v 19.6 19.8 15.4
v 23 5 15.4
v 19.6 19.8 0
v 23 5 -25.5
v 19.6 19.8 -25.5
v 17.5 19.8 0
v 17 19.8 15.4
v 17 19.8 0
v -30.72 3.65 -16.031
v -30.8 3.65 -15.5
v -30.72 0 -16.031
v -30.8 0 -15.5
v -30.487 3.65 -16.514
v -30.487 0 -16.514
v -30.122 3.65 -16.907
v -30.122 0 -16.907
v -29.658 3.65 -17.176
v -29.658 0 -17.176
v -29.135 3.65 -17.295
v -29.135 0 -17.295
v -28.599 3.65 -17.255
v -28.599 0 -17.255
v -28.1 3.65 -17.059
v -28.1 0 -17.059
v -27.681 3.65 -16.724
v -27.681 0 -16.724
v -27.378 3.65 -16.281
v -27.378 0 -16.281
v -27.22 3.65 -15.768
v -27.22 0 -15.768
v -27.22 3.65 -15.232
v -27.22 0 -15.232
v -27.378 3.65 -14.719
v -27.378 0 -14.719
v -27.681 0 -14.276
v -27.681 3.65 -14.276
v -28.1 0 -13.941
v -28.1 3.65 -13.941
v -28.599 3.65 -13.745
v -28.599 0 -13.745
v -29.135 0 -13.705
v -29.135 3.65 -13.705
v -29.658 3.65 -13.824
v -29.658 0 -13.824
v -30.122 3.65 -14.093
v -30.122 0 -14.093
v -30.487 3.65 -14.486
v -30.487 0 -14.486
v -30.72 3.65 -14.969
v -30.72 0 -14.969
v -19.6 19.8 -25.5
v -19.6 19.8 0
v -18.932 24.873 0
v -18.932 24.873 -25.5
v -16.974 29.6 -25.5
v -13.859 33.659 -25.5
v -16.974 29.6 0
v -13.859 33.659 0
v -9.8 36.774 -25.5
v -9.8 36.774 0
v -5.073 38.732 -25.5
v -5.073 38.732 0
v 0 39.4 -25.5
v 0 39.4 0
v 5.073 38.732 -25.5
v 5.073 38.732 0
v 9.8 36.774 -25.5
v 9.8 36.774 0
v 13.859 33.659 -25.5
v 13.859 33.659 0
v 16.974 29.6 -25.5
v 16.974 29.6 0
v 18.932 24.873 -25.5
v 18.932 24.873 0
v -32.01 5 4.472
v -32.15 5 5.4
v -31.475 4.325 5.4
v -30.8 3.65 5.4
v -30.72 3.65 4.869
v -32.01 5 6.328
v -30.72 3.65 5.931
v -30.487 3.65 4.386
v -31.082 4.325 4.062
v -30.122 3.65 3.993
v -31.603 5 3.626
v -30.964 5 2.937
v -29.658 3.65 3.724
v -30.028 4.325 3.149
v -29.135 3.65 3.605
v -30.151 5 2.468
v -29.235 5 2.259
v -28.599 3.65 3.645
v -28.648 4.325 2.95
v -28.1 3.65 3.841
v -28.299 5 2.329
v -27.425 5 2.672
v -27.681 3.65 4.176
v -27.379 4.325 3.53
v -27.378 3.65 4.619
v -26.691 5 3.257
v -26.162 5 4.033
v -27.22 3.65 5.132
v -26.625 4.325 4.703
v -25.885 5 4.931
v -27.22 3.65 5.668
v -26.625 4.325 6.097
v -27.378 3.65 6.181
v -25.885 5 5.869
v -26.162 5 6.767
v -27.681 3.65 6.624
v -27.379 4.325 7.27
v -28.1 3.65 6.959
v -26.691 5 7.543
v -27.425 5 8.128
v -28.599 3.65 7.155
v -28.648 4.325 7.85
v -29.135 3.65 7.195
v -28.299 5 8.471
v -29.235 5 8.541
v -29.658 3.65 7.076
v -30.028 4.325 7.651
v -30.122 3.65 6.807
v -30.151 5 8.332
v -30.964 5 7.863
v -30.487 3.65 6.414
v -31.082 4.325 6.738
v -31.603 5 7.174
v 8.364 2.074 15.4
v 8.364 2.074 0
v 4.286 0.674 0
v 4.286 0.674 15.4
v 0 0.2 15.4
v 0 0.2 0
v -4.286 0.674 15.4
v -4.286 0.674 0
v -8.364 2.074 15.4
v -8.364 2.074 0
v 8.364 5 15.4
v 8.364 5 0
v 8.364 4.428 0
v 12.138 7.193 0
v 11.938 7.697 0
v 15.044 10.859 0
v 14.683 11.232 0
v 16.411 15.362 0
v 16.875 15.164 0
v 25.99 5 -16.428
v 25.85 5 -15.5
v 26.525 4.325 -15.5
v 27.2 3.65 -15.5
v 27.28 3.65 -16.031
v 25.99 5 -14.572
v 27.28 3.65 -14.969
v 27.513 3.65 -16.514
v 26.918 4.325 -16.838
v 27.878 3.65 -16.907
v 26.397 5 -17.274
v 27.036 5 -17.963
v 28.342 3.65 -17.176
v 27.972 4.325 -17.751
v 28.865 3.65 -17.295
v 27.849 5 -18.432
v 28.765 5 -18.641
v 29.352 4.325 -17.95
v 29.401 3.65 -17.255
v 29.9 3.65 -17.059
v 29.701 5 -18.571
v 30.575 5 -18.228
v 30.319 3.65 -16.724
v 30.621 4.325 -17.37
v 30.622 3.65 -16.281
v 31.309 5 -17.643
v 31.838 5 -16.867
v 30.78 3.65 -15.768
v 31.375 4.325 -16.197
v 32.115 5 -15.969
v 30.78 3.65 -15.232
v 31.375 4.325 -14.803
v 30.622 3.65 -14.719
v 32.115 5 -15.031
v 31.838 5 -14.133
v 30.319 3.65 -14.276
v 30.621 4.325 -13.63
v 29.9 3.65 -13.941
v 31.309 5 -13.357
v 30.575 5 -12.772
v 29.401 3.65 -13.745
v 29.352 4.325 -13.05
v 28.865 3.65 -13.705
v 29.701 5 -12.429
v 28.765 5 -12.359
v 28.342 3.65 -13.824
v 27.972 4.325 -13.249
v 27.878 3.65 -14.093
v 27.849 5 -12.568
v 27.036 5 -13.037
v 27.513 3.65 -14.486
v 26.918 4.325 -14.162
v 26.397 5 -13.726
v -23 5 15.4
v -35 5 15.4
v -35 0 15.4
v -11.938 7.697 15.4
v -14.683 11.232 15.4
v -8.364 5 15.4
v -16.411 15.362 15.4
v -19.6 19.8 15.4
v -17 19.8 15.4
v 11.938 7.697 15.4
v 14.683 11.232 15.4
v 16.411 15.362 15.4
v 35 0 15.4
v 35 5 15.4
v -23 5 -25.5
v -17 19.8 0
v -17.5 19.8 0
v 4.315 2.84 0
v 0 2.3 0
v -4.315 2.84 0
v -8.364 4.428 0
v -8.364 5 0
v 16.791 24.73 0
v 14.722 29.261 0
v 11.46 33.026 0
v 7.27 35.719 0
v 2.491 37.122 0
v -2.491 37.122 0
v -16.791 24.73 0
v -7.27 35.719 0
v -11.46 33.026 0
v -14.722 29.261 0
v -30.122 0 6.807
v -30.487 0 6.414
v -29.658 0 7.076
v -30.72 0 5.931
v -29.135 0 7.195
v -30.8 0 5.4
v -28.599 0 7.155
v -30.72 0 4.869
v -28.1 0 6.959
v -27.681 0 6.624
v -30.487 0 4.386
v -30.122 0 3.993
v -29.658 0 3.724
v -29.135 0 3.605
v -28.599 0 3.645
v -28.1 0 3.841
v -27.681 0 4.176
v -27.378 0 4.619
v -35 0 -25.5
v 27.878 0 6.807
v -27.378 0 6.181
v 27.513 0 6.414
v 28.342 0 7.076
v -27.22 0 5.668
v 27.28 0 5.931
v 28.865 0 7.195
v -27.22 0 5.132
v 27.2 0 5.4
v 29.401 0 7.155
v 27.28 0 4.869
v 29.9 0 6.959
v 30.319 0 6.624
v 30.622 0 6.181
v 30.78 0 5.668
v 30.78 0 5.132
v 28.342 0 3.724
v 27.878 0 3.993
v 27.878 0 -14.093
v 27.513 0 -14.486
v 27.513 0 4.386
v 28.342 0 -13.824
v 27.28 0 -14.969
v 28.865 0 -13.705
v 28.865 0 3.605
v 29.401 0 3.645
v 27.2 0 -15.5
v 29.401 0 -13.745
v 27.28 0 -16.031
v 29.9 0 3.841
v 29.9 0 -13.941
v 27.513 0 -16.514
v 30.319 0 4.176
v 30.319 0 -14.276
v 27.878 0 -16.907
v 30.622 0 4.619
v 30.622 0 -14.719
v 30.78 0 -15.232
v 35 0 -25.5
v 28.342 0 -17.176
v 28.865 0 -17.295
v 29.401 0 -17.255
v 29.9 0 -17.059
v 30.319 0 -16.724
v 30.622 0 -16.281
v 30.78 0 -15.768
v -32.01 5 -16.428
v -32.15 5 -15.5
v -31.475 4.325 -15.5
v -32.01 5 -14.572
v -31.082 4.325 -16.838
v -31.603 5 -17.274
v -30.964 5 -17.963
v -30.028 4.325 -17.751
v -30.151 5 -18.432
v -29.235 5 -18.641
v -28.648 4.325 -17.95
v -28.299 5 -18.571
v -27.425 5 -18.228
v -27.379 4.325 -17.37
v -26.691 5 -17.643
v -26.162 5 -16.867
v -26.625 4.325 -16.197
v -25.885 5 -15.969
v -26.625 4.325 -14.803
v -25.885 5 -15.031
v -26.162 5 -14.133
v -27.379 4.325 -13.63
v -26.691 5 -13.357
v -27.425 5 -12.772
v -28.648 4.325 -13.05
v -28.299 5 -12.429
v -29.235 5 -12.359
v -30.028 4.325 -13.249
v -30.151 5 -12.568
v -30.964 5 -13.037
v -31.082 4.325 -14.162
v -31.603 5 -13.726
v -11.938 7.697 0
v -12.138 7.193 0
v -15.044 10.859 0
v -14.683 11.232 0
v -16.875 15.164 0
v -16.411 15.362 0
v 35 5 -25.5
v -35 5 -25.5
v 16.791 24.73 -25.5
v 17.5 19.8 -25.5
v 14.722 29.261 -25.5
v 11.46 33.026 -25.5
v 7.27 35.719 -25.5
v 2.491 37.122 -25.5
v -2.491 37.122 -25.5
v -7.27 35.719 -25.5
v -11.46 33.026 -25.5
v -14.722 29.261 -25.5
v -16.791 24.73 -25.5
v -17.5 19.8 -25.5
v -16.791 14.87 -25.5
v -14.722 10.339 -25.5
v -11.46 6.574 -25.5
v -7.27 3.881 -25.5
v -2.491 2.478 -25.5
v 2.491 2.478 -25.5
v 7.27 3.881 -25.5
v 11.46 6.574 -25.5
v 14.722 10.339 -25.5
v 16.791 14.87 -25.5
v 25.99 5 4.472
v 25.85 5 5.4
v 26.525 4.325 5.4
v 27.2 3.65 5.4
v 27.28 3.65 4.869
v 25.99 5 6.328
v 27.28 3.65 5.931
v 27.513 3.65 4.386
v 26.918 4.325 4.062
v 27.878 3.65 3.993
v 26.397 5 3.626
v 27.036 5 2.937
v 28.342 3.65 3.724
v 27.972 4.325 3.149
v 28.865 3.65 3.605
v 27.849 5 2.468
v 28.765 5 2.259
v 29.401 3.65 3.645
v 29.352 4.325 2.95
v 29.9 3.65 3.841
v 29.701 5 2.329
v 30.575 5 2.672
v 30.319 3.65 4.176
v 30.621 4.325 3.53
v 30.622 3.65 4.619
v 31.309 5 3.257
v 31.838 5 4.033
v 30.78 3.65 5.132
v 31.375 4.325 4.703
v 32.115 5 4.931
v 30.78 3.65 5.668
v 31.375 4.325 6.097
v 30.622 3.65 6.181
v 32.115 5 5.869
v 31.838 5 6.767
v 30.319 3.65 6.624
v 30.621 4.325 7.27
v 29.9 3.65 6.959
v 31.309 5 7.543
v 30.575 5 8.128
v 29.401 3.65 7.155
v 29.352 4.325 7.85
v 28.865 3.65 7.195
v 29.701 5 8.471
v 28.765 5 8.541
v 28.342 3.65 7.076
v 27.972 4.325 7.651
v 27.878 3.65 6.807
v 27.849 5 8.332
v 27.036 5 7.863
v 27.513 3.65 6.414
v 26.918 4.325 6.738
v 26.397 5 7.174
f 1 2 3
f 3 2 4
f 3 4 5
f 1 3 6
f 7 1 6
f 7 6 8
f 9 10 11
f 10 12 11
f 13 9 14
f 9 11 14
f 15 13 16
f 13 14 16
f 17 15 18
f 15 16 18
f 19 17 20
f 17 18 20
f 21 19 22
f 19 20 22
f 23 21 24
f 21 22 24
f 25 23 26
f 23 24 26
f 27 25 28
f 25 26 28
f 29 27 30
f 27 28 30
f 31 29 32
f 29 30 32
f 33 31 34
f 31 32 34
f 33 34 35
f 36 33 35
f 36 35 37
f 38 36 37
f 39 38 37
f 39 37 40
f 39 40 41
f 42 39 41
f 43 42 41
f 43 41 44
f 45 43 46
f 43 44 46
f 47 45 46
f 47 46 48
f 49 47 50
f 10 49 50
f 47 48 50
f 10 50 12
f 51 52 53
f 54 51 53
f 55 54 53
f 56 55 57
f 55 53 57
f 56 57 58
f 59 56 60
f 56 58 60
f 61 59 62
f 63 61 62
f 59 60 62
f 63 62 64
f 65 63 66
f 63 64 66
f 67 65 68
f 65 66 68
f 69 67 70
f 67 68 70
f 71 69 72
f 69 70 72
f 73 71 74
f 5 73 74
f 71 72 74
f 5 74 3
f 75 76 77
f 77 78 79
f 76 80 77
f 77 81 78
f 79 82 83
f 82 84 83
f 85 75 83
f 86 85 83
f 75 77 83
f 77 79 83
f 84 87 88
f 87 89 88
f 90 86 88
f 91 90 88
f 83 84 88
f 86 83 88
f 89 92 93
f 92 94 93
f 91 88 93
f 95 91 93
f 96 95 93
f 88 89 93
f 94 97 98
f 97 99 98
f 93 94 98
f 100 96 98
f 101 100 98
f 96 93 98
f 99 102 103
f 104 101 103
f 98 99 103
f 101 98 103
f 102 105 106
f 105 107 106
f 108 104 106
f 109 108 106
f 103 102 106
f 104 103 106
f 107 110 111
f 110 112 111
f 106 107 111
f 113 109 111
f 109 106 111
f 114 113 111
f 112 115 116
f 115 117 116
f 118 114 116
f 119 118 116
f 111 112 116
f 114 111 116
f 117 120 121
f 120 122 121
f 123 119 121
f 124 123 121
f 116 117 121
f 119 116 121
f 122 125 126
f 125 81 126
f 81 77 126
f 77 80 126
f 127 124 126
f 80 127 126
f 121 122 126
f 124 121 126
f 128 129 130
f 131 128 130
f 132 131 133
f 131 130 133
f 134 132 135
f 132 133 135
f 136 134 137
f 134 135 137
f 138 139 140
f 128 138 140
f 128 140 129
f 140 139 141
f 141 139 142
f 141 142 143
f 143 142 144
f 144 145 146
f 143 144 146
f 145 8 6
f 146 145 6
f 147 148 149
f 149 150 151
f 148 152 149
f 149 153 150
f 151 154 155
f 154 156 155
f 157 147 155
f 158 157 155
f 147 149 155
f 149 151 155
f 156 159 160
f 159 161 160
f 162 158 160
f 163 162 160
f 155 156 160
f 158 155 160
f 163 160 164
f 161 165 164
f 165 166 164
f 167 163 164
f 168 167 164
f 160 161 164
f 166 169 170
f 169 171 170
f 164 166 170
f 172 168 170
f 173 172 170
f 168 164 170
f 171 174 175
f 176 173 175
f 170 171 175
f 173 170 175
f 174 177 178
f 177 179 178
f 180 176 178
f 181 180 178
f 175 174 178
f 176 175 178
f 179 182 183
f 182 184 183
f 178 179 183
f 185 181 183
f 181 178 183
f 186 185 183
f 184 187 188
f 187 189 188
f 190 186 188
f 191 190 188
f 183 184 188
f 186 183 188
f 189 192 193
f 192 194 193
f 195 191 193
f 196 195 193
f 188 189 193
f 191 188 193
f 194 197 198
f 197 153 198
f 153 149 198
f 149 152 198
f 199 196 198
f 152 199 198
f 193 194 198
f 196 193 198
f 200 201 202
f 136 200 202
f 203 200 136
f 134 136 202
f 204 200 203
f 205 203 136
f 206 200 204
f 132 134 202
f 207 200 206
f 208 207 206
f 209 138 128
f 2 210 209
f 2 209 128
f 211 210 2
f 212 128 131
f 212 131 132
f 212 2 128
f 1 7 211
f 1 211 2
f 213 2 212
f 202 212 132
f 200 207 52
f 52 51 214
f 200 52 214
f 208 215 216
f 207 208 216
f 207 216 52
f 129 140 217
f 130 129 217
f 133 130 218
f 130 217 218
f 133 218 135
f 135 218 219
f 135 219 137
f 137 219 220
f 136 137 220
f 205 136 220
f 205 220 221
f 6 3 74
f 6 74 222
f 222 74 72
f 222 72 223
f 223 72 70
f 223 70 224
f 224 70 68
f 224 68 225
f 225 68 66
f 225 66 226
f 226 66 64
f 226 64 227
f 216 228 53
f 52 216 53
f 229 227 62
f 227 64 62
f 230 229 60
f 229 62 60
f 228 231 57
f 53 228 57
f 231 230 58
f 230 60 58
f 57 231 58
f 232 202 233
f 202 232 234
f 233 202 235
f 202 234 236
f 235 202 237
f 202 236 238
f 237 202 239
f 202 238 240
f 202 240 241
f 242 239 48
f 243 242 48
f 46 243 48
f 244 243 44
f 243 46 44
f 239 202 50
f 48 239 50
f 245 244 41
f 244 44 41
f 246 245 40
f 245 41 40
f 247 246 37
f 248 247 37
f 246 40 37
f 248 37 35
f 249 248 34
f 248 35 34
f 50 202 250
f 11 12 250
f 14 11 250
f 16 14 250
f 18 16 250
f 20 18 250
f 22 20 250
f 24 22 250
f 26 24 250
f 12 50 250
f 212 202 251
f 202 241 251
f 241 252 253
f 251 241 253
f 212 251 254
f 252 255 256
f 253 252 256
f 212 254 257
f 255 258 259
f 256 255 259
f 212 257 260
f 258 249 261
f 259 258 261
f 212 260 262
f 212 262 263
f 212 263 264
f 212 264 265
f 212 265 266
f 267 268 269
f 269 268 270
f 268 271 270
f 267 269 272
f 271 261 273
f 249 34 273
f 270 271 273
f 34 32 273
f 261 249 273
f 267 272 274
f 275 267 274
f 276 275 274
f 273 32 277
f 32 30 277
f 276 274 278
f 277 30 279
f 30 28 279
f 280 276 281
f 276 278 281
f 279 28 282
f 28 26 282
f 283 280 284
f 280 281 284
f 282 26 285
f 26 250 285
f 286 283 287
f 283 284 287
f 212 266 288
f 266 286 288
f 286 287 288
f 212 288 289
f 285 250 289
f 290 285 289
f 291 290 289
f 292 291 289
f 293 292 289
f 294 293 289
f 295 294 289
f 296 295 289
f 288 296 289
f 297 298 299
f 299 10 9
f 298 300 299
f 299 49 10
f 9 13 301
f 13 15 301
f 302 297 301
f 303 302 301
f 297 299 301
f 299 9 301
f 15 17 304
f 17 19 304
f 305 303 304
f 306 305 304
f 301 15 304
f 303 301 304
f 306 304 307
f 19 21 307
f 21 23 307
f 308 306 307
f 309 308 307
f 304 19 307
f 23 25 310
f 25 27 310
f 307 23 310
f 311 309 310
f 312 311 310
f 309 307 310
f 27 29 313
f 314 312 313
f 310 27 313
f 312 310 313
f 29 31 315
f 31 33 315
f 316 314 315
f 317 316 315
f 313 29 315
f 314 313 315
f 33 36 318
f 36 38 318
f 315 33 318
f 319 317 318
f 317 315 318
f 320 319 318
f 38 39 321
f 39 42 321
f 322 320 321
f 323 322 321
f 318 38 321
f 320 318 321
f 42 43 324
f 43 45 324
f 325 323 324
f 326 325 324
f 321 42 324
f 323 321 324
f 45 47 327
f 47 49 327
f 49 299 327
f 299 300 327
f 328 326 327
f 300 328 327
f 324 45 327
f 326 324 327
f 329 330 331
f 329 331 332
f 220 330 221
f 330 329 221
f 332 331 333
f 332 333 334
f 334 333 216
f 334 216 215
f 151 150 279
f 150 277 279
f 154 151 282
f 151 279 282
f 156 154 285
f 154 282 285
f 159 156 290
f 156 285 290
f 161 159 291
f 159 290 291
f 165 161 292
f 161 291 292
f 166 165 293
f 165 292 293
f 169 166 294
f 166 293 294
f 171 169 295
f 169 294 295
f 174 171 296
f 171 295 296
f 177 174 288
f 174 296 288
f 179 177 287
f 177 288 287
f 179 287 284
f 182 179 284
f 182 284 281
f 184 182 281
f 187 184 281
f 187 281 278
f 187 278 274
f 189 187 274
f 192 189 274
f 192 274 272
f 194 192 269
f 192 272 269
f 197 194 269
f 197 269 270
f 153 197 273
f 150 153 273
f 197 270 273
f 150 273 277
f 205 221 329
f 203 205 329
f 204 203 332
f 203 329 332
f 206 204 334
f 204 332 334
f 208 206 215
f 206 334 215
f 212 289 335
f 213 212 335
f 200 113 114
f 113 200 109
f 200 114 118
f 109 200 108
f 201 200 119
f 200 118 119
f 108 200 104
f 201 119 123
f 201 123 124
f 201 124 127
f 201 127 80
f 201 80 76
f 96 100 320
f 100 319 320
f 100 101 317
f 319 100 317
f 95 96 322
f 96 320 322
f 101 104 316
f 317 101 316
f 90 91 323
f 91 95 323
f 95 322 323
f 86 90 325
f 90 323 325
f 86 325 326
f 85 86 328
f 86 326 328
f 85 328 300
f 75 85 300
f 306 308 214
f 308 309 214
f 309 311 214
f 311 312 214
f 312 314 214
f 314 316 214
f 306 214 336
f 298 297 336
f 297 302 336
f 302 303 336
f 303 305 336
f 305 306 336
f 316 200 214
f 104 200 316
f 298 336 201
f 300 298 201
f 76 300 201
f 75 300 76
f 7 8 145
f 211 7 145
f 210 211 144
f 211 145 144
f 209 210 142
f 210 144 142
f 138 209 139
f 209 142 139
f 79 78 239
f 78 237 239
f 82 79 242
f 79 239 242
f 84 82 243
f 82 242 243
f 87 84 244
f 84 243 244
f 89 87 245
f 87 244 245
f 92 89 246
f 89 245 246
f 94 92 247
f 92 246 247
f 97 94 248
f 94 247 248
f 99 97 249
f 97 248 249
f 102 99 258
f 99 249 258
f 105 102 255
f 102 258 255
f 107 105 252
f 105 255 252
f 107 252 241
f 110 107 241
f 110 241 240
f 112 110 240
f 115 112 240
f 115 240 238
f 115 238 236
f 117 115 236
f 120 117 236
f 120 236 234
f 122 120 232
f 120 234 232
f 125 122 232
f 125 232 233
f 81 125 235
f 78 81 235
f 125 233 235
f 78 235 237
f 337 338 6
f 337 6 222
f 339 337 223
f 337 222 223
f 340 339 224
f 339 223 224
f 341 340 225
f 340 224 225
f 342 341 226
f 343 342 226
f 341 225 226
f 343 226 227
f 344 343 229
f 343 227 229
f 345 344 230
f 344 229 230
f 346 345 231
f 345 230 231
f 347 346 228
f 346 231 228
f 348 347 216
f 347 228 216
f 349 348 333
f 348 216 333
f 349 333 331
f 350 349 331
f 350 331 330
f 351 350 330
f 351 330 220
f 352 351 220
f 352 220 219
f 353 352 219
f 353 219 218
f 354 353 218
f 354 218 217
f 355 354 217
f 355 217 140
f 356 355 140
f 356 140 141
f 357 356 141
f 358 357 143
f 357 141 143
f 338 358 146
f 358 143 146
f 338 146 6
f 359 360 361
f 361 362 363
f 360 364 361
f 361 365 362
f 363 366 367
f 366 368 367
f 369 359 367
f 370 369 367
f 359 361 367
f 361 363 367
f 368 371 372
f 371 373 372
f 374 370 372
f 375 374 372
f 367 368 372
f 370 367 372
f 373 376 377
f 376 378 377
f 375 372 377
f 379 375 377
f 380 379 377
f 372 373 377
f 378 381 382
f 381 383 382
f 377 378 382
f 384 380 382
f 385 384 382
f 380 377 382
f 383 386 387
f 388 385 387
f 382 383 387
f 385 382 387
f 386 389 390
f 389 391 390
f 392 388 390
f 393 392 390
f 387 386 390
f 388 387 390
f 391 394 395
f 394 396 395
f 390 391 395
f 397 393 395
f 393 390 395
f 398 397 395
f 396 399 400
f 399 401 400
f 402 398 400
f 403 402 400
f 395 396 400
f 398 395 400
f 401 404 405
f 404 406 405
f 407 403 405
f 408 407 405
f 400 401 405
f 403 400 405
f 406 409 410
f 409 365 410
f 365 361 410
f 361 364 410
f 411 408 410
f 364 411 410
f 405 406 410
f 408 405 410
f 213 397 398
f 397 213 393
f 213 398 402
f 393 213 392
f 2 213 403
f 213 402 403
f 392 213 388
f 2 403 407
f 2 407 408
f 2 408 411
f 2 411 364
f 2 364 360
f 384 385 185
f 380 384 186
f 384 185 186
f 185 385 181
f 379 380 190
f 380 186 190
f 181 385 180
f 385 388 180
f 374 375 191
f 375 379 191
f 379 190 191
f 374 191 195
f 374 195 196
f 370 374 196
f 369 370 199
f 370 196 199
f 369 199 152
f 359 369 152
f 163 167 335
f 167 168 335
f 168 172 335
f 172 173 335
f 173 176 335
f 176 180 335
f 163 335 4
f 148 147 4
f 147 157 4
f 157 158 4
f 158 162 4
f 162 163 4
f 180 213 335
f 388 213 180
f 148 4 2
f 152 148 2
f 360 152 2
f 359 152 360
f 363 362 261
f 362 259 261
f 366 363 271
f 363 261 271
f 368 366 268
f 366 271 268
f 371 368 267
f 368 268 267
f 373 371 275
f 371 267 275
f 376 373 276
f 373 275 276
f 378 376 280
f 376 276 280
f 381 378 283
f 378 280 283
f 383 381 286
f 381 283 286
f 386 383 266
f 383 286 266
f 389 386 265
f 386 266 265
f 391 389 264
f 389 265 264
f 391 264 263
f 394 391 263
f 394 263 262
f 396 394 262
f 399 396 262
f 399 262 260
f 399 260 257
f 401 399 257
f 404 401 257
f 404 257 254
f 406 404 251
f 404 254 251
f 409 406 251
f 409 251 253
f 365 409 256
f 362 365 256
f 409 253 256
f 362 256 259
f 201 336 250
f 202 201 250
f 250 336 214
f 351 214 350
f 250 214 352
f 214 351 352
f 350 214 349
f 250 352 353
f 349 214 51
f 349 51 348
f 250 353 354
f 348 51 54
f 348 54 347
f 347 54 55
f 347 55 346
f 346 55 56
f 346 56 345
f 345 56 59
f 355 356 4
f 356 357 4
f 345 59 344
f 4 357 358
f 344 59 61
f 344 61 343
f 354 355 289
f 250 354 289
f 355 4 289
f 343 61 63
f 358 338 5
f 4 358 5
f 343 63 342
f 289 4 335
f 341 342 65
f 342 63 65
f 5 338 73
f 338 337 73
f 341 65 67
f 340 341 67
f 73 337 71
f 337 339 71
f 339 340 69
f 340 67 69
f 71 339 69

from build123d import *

# Parameters (mm, degrees)
SKETCH1_R                                       = 17.5
BOSS_EXTRUDE9_DEPTH                             = 25.5
BOSS_EXTRUDE10_DEPTH                            = 15.4
BOSS_EXTRUDE10_DEPTH_BACK                       = 25.5
CSK_FOR_M3_FLAT_HEAD_MACHINE_SCREW1_D           = 3.6
CSK_FOR_M3_FLAT_HEAD_MACHINE_SCREW1_CSINK_D     = 6.3
CSK_FOR_M3_FLAT_HEAD_MACHINE_SCREW1_CSINK_ANGLE = 90
CSK_FOR_M3_FLAT_HEAD_MACHINE_SCREW2_D           = 3.6
CSK_FOR_M3_FLAT_HEAD_MACHINE_SCREW2_CSINK_D     = 6.3
CSK_FOR_M3_FLAT_HEAD_MACHINE_SCREW2_CSINK_ANGLE = 90
BOSS_EXTRUDE12_DEPTH                            = 15.4


with BuildPart() as part:
    # Sketch1 → Boss-Extrude9 (new body)
    with BuildSketch(Plane.XY):
        with BuildLine():
            ThreePointArc((-19.6, 19.8), (0, 39.4), (19.6, 19.8))
            ThreePointArc((19.6, 19.8), (0, 0.2), (-19.6, 19.8))
        make_face()
        with Locations((0, 19.8)):
            Circle(SKETCH1_R, mode=Mode.SUBTRACT)
    extrude(amount=-BOSS_EXTRUDE9_DEPTH)

    # Sketch1_15 → Boss-Extrude10 (add, two sides: drawn at the far end of the back side and taken through both)
    with BuildSketch(Plane.XY.offset(-BOSS_EXTRUDE10_DEPTH_BACK)):
        with BuildLine():
            Line((-23, 5), (-35, 5))
            Line((-35, 5), (-35, 0))
            Line((-35, 0), (35, 0))
            Line((35, 0), (35, 5))
            Line((35, 5), (23, 5))
            Line((23, 5), (19.6, 19.8))
            ThreePointArc((19.6, 19.8), (0, 0.2), (-19.6, 19.8))
            Line((-19.6, 19.8), (-23, 5))
        make_face()
    extrude(amount=BOSS_EXTRUDE10_DEPTH + BOSS_EXTRUDE10_DEPTH_BACK)

    # CSK for M3 Flat Head Machine Screw1 (through all)
    with Locations(Plane(origin=(0, 5, 0), x_dir=(1, 0, 0), z_dir=(0, 1, 0))):
        with Locations((-29, 15.5), (-29, -5.4)):
            CounterSinkHole(CSK_FOR_M3_FLAT_HEAD_MACHINE_SCREW1_D / 2, CSK_FOR_M3_FLAT_HEAD_MACHINE_SCREW1_CSINK_D / 2, counter_sink_angle=CSK_FOR_M3_FLAT_HEAD_MACHINE_SCREW1_CSINK_ANGLE)

    # CSK for M3 Flat Head Machine Screw2 (through all)
    with Locations(Plane(origin=(0, 5, 0), x_dir=(1, 0, 0), z_dir=(0, 1, 0))):
        with Locations((29, -5.4), (29, 15.5)):
            CounterSinkHole(CSK_FOR_M3_FLAT_HEAD_MACHINE_SCREW2_D / 2, CSK_FOR_M3_FLAT_HEAD_MACHINE_SCREW2_CSINK_D / 2, counter_sink_angle=CSK_FOR_M3_FLAT_HEAD_MACHINE_SCREW2_CSINK_ANGLE)

    # Sketch20 → Boss-Extrude12 (add)
    with BuildSketch(Plane.XY):
        with BuildLine():
            ThreePointArc((17, 19.8), (14.683180189, 11.232373751), (8.364209467, 5))
            Line((8.364209467, 5), (8.364209467, 2.074312425))
            ThreePointArc((8.364209467, 2.074312425), (16.554433025, 9.30663318), (19.6, 19.8))
            Line((19.6, 19.8), (17, 19.8))
        make_face()
        with BuildLine():
            Line((-8.364209467, 2.074312425), (-8.364209467, 5))
            ThreePointArc((-8.364209467, 5), (-14.683180189, 11.232373751), (-17, 19.8))
            Line((-17, 19.8), (-19.6, 19.8))
            ThreePointArc((-19.6, 19.8), (-16.554433025, 9.30663318), (-8.364209467, 2.074312425))
        make_face()
    extrude(amount=BOSS_EXTRUDE12_DEPTH)


solid = part.part
